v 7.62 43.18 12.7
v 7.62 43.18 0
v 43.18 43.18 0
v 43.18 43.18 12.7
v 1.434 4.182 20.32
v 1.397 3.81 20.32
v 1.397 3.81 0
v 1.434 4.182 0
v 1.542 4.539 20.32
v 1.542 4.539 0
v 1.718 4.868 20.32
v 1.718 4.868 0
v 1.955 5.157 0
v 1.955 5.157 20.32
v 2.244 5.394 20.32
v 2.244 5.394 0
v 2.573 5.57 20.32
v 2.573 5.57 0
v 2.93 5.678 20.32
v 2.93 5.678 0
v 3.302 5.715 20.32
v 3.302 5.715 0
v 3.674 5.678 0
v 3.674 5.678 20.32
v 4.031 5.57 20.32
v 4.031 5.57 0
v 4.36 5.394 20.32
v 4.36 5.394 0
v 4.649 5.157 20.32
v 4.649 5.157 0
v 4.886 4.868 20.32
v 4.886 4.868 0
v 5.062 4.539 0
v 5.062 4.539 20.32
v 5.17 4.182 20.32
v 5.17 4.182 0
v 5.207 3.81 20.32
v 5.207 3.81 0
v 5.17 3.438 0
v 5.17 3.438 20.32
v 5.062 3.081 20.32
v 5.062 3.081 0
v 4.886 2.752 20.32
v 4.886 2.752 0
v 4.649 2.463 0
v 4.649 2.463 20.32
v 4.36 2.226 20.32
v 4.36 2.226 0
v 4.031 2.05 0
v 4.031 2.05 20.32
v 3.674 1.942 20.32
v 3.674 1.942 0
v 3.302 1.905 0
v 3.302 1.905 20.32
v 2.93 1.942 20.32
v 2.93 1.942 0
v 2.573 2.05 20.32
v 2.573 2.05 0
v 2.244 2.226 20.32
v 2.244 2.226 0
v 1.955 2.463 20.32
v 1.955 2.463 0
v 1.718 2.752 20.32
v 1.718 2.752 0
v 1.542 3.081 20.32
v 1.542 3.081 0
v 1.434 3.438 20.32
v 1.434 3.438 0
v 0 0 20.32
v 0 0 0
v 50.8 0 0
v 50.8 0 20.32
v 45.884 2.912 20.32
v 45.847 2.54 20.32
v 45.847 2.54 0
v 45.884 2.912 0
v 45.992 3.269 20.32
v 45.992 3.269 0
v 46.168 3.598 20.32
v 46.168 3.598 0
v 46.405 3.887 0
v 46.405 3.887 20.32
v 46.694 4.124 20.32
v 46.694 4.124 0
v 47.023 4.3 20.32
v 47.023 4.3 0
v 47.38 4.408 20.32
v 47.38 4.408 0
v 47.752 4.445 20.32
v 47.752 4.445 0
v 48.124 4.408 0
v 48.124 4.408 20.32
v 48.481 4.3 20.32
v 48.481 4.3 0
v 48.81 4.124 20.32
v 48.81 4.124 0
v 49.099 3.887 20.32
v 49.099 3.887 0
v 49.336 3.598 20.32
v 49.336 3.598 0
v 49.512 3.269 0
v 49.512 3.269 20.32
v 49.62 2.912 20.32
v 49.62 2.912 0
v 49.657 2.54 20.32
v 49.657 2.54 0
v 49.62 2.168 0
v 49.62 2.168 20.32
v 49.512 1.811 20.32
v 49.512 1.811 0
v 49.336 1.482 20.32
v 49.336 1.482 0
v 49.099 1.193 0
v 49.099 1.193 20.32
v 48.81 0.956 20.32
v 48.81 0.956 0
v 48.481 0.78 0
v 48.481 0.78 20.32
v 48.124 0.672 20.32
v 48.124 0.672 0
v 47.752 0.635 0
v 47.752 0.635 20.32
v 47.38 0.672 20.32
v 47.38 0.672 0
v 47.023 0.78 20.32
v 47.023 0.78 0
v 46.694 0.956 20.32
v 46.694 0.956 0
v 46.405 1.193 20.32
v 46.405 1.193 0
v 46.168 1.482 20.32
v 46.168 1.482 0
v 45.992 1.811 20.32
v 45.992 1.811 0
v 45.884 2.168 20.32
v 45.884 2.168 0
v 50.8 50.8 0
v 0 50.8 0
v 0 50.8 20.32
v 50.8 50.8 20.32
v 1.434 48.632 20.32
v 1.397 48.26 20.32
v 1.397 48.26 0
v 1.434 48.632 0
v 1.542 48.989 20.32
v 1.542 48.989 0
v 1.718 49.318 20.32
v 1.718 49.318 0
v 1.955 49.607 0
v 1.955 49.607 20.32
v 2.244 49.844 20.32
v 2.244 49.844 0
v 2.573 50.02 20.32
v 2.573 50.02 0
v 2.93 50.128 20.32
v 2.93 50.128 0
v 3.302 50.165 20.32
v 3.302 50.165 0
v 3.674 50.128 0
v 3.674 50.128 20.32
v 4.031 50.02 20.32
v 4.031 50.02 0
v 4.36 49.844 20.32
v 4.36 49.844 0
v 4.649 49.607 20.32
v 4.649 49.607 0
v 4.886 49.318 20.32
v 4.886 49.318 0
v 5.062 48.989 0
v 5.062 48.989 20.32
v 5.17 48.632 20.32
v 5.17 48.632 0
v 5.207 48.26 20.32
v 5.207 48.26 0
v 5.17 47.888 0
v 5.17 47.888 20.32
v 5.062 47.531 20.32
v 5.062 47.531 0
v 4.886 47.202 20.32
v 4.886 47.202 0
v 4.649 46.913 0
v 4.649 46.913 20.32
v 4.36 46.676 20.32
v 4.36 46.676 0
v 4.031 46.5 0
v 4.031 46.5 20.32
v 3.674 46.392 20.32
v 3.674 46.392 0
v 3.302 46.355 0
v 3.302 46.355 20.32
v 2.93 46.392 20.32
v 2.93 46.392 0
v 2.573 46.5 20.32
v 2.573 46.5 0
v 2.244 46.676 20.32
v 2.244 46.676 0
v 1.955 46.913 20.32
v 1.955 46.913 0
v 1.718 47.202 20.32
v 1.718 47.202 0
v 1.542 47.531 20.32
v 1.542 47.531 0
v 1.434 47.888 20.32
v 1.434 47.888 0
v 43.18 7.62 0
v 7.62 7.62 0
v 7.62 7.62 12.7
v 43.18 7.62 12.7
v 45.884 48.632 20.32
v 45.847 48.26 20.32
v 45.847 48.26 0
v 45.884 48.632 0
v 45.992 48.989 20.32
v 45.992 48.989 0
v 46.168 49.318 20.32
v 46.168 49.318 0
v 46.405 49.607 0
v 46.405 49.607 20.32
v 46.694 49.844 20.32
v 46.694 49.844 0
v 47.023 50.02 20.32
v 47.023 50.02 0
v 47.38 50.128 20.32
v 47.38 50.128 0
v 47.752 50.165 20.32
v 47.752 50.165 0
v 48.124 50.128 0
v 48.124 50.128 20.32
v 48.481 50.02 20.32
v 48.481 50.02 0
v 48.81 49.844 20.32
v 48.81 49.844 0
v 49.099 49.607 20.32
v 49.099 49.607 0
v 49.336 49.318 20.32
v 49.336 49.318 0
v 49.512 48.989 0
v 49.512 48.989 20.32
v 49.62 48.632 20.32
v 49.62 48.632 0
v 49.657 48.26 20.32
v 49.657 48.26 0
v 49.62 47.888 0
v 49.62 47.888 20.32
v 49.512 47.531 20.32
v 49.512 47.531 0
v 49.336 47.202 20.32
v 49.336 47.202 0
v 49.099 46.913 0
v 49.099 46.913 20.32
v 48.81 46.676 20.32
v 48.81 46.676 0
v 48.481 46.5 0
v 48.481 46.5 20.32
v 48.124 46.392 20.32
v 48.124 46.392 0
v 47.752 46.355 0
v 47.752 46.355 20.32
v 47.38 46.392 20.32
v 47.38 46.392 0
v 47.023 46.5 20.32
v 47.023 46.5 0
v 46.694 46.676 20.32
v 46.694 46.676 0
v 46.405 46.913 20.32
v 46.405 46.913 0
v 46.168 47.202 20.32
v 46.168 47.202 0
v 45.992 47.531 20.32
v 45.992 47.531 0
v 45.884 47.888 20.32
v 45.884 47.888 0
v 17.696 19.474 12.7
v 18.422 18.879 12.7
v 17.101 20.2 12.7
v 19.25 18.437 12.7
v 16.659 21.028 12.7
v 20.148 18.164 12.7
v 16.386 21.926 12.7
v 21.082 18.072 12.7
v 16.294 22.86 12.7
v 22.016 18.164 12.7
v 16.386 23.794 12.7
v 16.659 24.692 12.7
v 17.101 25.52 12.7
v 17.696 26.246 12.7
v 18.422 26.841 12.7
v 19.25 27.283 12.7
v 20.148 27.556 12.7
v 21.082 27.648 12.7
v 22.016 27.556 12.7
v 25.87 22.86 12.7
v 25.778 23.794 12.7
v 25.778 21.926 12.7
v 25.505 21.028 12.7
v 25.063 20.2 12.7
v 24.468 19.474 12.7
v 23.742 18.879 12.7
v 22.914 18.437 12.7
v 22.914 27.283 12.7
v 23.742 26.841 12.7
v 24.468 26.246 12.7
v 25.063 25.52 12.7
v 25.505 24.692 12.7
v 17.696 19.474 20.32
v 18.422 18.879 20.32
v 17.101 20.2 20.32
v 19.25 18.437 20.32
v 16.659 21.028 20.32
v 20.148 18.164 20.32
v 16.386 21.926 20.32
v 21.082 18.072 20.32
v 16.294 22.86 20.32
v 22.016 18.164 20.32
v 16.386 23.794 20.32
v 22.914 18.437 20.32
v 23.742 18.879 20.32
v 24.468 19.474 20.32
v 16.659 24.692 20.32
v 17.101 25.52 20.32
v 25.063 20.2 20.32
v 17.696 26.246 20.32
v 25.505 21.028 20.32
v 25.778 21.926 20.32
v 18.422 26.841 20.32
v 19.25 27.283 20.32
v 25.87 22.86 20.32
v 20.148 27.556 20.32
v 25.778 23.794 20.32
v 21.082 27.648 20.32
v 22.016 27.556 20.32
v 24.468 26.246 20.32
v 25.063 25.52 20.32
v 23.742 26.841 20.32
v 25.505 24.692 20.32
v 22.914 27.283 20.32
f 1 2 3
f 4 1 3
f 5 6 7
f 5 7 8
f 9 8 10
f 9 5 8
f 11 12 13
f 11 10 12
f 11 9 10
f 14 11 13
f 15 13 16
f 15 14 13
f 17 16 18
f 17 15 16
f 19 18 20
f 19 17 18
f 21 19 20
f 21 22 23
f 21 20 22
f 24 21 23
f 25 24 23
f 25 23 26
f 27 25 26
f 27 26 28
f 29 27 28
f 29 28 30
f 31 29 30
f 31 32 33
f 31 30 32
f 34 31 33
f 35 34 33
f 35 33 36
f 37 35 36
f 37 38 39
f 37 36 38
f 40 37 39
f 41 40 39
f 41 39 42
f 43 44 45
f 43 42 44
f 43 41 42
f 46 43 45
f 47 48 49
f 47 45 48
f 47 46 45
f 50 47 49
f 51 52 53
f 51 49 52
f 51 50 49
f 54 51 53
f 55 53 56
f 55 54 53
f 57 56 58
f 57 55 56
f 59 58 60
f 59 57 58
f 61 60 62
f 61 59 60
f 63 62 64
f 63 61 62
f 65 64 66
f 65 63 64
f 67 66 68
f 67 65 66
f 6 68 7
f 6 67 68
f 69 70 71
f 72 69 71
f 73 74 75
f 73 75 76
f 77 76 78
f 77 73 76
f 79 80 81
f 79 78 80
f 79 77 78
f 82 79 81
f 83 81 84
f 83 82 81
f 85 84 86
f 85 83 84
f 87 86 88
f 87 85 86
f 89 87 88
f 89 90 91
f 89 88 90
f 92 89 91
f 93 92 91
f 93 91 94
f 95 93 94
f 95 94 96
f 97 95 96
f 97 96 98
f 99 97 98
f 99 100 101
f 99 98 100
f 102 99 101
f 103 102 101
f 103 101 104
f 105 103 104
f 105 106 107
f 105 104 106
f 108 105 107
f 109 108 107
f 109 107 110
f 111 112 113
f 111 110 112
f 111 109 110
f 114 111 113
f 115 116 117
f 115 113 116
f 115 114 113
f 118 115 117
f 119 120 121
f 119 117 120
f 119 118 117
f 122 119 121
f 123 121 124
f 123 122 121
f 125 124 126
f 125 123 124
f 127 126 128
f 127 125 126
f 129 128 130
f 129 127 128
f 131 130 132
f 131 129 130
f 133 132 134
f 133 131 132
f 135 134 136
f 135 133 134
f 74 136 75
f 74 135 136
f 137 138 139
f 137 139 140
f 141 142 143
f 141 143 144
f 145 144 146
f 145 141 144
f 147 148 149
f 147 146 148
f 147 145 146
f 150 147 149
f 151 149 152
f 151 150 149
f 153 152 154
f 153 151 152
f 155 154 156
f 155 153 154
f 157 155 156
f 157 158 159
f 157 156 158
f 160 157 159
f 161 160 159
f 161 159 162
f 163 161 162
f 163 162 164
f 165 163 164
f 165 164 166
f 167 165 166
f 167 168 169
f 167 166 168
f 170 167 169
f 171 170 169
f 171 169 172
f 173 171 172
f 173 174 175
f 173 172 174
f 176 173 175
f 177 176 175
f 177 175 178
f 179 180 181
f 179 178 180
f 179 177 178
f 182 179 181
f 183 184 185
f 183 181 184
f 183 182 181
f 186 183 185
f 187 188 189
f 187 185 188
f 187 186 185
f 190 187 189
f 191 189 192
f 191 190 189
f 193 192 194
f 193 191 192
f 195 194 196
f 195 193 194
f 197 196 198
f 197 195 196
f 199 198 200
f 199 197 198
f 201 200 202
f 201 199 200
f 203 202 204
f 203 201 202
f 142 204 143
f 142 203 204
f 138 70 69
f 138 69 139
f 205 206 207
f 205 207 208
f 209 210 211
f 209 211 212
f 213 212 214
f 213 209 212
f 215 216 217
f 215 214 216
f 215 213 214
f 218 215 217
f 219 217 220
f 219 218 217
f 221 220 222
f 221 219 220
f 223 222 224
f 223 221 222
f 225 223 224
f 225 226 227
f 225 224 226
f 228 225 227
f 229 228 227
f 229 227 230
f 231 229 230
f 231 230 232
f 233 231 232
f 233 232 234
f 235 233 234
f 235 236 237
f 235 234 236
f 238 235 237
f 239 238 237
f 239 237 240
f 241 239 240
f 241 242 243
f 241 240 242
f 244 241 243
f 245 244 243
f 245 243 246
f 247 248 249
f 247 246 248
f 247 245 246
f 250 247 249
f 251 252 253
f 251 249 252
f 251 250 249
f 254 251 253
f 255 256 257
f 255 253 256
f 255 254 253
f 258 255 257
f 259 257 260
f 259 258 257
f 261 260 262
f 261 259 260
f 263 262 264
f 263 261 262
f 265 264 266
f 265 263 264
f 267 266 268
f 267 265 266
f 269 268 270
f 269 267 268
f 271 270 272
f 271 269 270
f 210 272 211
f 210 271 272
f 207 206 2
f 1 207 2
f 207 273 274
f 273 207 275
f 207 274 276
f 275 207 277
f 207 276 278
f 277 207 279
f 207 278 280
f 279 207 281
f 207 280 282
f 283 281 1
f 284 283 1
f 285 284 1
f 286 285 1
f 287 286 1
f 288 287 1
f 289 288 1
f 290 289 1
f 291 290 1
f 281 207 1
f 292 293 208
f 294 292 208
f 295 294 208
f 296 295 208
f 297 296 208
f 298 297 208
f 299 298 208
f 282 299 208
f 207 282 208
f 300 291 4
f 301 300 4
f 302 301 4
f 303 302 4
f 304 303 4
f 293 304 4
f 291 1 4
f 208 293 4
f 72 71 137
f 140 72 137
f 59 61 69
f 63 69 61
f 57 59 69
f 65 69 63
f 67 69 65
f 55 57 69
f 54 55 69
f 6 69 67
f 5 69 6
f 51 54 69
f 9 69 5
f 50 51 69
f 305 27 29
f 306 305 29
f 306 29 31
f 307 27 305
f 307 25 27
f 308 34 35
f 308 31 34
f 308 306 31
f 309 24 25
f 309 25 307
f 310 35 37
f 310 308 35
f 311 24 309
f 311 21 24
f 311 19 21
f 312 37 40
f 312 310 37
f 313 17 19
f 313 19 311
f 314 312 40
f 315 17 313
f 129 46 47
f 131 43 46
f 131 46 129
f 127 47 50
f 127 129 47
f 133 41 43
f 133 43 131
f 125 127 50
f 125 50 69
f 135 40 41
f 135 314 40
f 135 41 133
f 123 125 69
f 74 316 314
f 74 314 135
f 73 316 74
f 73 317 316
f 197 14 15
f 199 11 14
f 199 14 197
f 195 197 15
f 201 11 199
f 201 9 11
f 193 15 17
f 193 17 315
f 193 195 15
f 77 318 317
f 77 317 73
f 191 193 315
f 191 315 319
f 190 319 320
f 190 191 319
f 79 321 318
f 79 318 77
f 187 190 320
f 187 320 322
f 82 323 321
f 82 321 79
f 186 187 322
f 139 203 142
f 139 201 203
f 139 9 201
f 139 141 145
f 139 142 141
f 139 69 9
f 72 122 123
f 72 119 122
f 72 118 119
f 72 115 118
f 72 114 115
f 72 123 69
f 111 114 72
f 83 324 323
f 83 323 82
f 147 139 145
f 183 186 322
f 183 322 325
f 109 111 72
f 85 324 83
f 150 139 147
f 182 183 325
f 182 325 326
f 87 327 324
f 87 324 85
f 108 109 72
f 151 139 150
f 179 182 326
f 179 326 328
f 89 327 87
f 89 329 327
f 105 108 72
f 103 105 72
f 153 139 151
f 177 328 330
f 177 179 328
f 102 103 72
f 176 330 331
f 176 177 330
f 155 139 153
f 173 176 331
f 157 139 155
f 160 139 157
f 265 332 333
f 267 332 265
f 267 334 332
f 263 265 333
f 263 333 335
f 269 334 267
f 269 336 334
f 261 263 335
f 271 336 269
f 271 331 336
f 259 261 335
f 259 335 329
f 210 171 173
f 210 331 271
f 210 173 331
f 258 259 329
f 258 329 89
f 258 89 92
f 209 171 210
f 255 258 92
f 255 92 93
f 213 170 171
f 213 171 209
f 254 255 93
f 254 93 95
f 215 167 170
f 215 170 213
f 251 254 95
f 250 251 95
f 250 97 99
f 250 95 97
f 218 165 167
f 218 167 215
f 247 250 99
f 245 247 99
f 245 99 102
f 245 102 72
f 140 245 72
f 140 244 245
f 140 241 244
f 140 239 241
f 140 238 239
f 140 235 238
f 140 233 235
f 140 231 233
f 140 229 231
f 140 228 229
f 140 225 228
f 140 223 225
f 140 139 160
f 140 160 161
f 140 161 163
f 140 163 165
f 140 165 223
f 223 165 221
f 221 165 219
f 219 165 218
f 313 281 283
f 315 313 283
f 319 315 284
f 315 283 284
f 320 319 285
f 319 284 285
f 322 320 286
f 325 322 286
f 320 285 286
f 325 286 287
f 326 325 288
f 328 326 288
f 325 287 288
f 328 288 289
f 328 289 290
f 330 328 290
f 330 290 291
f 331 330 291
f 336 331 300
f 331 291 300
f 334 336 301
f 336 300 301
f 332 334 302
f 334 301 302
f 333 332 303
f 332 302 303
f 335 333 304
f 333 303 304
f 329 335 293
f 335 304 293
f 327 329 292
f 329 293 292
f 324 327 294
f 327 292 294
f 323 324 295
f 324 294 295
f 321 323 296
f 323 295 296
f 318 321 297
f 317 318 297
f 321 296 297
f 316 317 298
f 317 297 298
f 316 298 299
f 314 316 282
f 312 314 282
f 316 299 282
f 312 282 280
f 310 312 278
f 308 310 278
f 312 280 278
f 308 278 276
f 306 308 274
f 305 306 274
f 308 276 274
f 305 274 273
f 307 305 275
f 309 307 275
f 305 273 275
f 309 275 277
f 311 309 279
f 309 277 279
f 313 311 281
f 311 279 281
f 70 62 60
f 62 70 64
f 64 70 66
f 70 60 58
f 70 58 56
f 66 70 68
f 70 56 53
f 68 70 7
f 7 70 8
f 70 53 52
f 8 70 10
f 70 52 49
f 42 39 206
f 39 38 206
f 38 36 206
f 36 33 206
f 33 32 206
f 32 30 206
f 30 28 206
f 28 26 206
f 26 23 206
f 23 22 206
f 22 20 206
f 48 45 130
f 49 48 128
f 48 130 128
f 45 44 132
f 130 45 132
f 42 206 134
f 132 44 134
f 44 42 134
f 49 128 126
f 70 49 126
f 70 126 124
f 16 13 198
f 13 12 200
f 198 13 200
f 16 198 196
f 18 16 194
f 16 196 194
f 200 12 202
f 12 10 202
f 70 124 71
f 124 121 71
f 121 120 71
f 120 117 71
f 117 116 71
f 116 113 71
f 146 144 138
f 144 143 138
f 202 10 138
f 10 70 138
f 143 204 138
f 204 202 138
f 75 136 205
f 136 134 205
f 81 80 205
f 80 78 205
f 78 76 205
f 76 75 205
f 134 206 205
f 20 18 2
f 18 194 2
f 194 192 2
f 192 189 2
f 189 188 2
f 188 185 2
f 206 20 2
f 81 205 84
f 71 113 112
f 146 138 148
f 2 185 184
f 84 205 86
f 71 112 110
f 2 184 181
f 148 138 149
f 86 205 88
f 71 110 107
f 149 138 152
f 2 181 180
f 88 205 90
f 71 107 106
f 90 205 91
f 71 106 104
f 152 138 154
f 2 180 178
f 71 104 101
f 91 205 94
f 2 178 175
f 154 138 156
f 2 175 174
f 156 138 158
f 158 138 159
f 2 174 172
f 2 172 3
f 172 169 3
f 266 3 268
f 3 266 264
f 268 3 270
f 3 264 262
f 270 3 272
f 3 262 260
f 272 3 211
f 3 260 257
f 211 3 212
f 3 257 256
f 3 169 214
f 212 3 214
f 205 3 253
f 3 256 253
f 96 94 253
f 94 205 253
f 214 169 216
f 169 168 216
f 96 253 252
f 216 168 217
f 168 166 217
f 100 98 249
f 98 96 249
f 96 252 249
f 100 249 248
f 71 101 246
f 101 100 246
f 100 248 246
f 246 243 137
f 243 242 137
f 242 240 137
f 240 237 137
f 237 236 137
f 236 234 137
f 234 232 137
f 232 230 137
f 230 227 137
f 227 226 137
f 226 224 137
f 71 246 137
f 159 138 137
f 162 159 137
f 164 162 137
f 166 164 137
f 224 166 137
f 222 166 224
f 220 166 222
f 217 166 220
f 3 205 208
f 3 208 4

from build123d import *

# Parameters (mm, degrees)
SKETCH7_W               = 50.8
SKETCH7_H               = 50.8
BOSS_EXTRUDE3_DEPTH     = 20.32
SHELL4_T                = -7.62
CUT_EXTRUDE4_DEPTH      = 20.066
CUT_EXTRUDE4_DEPTH_BACK = 73.955945611
SKETCH10_R              = 1.905
SKETCH11_R              = 4.7879
CUT_EXTRUDE5_DEPTH      = 7.62


with BuildPart() as part:
    # Sketch7 → Boss-Extrude3 (new body)
    with BuildSketch(Plane.XY):
        with Locations((25.4, 25.4)):
            Rectangle(SKETCH7_W, SKETCH7_H)
    extrude(amount=BOSS_EXTRUDE3_DEPTH)

    # Shell4
    shell4_openings = [part.faces().sort_by_distance(p)[0] for p in [
        (25.4, 25.4, 0),
    ]]
    offset(amount=SHELL4_T, openings=shell4_openings, kind=Kind.INTERSECTION)

    # Sketch10 → Cut-Extrude4 (cut, two sides: drawn at the far end of the back side and taken through both)
    with BuildSketch(Plane(origin=(0, 0, 12.7), x_dir=(-1, 0, 0), z_dir=(0, 0, -1)).offset(-CUT_EXTRUDE4_DEPTH_BACK)):
        with Locations((-47.752, 48.26)):
            Circle(SKETCH10_R)
        with Locations((-3.302, 48.26)):
            Circle(SKETCH10_R)
        with Locations((-47.752, 2.54)):
            Circle(SKETCH10_R)
        with Locations((-3.302, 3.81)):
            Circle(SKETCH10_R)
    extrude(amount=CUT_EXTRUDE4_DEPTH + CUT_EXTRUDE4_DEPTH_BACK, mode=Mode.SUBTRACT)

    # Sketch11 → Cut-Extrude5 (cut)
    with BuildSketch(Plane(origin=(0, 0, 12.7), x_dir=(-1, 0, 0), z_dir=(0, 0, -1))):
        with Locations((-21.082, 22.86)):
            Circle(SKETCH11_R)
    extrude(amount=-CUT_EXTRUDE5_DEPTH, mode=Mode.SUBTRACT)


solid = part.part
